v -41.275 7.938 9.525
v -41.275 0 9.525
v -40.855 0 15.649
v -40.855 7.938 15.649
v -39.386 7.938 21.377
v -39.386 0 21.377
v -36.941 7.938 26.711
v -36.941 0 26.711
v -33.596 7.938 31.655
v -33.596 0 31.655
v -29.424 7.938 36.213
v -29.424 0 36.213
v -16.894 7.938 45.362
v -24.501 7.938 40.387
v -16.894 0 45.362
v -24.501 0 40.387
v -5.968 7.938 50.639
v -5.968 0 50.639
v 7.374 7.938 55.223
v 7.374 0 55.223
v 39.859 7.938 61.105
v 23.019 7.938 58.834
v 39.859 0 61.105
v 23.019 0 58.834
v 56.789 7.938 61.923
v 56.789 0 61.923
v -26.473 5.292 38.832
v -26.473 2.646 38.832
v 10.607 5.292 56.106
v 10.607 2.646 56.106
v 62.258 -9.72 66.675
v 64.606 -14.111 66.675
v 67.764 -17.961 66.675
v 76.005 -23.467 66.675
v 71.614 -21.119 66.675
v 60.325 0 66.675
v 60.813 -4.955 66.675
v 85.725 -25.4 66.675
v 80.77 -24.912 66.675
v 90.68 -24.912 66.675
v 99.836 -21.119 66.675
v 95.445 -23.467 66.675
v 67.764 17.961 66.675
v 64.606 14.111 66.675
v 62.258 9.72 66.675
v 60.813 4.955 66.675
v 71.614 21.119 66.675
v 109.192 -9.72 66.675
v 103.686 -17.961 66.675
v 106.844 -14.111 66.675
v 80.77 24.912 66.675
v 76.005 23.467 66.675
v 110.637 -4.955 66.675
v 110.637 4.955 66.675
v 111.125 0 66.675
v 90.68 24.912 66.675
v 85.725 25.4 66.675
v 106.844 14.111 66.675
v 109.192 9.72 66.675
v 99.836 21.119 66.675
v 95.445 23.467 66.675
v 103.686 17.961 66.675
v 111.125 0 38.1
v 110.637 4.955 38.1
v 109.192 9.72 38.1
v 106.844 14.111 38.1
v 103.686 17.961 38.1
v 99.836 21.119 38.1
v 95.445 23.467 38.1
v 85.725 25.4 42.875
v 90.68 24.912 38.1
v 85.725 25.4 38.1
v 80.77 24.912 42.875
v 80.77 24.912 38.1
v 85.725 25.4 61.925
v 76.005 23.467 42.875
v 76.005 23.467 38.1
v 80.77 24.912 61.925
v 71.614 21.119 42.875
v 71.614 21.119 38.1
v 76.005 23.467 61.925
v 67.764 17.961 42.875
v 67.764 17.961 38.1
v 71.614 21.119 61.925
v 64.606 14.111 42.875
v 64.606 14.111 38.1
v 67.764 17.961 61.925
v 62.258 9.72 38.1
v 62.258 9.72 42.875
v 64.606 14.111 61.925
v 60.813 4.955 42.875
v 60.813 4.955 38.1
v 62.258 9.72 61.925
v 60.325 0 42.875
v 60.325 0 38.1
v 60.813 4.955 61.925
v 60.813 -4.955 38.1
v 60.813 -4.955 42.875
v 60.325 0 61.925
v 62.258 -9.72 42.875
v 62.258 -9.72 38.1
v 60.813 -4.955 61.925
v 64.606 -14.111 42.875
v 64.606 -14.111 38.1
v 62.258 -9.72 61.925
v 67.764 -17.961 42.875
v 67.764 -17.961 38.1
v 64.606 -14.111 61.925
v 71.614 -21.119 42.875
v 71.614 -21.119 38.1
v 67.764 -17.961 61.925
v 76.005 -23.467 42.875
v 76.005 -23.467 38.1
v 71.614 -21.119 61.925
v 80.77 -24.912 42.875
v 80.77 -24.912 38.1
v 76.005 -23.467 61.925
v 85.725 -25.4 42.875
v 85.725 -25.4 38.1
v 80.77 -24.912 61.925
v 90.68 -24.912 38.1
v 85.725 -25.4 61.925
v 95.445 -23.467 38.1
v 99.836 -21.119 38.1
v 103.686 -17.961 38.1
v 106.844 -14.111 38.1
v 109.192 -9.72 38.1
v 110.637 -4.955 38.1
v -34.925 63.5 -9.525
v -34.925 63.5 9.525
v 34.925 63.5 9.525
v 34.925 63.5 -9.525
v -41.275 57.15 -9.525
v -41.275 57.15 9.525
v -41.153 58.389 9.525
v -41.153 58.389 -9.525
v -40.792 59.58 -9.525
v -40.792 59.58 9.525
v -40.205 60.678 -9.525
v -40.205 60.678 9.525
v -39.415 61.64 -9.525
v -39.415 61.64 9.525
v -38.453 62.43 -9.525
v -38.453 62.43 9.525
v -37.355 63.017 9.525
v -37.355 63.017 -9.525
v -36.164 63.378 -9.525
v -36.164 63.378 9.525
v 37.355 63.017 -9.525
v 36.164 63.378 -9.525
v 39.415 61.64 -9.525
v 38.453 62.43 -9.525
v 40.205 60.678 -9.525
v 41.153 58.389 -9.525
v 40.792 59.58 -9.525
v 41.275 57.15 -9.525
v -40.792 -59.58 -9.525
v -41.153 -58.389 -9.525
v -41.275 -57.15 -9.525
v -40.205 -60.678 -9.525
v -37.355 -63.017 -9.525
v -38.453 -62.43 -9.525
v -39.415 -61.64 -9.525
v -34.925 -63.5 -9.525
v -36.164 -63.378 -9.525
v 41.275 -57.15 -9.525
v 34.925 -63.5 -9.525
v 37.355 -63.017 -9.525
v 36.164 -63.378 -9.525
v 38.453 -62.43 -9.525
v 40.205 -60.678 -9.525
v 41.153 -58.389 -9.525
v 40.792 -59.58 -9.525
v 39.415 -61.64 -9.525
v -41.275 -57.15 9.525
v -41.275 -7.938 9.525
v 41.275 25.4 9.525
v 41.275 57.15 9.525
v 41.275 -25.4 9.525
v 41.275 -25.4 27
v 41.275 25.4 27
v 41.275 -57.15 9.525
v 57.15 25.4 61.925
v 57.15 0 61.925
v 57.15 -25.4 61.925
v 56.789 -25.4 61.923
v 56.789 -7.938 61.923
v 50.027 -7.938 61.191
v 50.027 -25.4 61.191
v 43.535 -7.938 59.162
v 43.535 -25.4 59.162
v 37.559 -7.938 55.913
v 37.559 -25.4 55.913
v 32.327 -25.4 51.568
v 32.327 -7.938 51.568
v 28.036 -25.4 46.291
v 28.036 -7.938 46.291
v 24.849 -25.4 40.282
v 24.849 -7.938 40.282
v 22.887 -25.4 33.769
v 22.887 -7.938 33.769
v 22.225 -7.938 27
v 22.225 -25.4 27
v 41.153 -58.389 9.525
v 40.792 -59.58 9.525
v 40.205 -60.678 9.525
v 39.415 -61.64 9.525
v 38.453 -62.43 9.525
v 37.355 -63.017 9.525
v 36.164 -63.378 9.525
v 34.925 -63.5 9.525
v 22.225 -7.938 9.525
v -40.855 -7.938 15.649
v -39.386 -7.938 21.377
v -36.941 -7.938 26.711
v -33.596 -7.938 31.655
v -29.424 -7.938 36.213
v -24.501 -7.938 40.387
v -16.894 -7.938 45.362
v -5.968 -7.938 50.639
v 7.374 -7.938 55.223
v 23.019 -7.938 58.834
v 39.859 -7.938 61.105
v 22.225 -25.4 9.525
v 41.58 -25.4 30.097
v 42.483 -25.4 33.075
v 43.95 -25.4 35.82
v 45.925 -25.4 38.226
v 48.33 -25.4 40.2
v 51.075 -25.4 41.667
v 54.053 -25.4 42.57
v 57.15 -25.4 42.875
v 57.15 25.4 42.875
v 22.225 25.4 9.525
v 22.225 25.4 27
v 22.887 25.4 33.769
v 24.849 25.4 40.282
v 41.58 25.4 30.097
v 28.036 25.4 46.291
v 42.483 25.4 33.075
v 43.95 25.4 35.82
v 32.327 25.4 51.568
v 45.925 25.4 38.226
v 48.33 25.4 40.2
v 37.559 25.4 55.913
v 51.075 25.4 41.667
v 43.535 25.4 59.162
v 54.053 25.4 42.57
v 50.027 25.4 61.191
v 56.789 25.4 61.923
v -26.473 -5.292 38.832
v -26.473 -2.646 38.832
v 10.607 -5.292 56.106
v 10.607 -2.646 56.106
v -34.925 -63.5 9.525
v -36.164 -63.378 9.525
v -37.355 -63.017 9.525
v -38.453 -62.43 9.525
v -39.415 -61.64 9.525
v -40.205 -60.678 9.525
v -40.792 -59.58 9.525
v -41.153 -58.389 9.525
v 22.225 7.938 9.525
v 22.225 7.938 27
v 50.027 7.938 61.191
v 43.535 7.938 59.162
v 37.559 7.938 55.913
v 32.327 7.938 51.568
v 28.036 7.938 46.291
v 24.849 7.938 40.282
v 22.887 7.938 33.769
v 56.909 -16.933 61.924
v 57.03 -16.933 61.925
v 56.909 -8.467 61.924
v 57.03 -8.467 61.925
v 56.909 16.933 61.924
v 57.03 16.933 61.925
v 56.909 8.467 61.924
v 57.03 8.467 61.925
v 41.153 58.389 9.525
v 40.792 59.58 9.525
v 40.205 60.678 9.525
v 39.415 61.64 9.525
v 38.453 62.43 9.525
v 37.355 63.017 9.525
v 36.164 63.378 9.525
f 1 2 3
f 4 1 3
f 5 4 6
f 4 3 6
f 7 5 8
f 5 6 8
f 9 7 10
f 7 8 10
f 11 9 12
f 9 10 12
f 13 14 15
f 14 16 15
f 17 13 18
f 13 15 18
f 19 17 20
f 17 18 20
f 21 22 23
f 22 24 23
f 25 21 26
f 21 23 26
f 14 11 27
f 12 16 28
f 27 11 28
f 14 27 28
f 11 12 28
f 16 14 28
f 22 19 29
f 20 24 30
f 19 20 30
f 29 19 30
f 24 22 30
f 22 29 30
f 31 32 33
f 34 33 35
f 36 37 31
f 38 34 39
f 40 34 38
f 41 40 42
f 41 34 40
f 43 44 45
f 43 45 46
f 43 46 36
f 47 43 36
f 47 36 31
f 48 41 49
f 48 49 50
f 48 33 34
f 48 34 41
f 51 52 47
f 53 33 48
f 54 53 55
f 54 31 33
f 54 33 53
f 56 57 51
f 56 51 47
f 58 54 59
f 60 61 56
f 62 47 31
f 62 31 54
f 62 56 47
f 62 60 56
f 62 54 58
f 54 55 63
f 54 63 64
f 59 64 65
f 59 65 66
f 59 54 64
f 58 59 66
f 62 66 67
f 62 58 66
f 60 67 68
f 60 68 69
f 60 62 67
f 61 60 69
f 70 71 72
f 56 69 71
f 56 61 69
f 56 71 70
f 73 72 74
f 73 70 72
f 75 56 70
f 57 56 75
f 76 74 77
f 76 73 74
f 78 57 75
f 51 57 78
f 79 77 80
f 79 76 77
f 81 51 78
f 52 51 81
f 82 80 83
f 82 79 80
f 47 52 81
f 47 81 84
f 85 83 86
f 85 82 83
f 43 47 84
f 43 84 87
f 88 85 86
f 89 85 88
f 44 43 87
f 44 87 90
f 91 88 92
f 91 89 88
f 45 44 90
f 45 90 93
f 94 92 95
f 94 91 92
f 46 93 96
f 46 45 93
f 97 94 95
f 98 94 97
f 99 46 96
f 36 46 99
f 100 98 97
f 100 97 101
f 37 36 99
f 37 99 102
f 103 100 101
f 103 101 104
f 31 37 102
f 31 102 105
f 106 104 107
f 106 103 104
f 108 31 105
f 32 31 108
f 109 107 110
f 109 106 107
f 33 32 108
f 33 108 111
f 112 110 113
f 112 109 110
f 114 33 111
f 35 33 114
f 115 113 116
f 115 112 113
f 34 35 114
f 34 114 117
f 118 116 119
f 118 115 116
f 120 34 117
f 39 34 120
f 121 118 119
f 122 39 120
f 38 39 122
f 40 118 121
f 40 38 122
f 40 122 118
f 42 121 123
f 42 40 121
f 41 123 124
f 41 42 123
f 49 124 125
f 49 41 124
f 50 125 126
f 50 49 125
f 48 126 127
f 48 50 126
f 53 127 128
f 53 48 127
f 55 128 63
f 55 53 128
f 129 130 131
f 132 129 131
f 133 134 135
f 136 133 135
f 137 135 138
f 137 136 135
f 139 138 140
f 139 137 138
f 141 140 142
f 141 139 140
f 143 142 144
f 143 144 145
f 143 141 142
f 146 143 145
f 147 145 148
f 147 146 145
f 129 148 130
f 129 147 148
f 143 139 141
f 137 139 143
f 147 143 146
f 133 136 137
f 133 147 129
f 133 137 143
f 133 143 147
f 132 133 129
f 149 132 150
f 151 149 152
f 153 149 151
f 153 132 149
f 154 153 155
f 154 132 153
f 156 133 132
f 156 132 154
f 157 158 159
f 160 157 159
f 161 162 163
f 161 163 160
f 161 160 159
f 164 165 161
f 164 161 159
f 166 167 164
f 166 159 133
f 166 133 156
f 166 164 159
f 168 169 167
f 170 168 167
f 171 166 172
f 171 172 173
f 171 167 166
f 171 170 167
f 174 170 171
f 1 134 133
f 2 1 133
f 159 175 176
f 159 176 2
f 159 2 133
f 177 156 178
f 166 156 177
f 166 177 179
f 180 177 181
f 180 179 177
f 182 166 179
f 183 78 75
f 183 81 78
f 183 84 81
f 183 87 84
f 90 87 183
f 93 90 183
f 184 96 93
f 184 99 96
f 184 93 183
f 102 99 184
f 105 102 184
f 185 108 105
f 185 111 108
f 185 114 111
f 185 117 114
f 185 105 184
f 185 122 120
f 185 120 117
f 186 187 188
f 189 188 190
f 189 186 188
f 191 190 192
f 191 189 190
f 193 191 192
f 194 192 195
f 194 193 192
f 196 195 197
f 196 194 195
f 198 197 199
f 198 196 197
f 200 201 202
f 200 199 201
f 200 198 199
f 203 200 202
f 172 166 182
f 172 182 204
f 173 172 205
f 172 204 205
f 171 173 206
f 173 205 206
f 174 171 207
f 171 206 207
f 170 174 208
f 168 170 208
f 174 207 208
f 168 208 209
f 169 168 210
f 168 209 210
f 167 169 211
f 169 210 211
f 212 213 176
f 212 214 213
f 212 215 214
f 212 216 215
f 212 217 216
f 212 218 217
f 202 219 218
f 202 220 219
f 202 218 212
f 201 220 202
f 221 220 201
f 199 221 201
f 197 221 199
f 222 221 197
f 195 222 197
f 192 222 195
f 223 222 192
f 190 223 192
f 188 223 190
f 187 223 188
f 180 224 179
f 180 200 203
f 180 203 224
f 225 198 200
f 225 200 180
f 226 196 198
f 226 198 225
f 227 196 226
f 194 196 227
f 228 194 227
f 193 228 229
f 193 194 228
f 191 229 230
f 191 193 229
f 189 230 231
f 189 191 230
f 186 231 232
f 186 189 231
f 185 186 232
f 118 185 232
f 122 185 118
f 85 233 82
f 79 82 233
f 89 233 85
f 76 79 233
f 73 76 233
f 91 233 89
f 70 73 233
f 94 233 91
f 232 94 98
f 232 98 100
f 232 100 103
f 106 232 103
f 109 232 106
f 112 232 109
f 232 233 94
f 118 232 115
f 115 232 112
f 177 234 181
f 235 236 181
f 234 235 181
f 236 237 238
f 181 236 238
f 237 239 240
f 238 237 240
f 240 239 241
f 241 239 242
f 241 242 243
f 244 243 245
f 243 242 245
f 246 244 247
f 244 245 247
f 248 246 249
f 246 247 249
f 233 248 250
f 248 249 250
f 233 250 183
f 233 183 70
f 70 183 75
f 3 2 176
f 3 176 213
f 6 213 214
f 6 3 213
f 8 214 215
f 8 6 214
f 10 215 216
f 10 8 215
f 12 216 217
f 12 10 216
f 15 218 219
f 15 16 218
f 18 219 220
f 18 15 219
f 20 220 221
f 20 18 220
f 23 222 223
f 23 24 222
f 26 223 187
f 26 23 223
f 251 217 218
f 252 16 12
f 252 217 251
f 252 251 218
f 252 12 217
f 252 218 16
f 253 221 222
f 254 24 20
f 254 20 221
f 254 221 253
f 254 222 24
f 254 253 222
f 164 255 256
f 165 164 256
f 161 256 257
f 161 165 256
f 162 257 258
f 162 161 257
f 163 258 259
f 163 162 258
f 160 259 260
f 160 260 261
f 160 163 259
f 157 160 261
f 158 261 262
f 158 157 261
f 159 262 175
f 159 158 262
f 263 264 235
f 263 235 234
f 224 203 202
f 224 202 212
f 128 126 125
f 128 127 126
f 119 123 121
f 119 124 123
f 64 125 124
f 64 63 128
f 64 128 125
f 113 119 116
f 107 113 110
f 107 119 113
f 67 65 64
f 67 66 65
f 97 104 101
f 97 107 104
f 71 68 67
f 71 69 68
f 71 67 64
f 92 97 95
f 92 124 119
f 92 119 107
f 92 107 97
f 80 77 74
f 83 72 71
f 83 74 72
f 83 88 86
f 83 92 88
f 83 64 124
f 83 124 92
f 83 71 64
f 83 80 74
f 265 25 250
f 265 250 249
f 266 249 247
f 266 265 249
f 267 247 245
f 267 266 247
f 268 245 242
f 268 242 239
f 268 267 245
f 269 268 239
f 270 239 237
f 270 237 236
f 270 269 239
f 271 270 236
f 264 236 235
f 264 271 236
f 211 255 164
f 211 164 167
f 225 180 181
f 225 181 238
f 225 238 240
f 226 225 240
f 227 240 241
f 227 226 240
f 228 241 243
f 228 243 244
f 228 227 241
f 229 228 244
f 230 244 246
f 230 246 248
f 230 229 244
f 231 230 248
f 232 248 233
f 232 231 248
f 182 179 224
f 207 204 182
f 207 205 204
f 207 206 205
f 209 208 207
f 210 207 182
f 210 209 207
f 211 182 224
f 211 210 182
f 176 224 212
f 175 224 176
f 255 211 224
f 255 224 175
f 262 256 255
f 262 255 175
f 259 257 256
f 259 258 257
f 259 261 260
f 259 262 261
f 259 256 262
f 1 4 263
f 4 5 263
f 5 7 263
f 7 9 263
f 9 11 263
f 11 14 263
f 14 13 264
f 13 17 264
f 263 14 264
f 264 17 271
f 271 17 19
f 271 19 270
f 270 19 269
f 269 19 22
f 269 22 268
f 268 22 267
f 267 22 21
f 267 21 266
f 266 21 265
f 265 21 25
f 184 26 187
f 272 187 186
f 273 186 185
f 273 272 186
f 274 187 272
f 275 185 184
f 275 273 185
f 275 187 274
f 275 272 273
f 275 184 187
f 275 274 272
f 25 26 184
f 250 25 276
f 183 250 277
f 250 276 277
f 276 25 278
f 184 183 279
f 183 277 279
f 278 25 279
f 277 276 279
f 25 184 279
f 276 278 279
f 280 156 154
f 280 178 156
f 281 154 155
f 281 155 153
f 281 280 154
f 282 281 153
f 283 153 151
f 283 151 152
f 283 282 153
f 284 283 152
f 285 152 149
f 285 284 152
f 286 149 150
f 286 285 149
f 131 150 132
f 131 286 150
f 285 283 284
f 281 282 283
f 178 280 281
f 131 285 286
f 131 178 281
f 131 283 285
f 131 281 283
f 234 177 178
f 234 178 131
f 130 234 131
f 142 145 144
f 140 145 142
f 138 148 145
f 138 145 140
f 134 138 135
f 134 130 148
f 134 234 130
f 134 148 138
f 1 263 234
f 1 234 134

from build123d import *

# Parameters (mm, degrees)
F1_DEPTH = 63.5
F0_W     = 25.4
F0_H     = 19.05
F2_DEPTH = 25.4
F4_R     = 6.35
F5_DEPTH = 7.9375


with BuildPart() as f1:
    # F0 (on Front) → F1 (new body, symmetric)
    with BuildSketch(Plane.XZ):
        Polygon((41.275, -9.525), (41.275, 9.525), (22.225, 9.525), (-41.275, 9.525), (-41.275, -9.525), align=None)
    extrude(amount=F1_DEPTH, both=True)

    # F0 (on Front) → F2 (join, symmetric)
    with BuildSketch(Plane.XZ):
        with BuildLine():
            Line((22.225, 9.525), (41.275, 9.525))
            Line((41.275, 9.525), (41.275, 27.0002))
            ThreePointArc((41.275, 27.0002), (45.9246798487, 38.2255201513), (57.15, 42.8752))
            Line((57.15, 42.8752), (60.325, 42.8752))
            Line((60.325, 42.8752), (60.325, 61.9252))
            Line((60.325, 61.9252), (57.15, 61.9252))
            add(Edge.make_bspline(
                [(56.7889636958, 61.9233338483), (56.9093507324, 61.9240660215), (57.0296965137, 61.9246880569), (57.15, 61.9252)],
                knots=[111.215608545, 111.215608545, 111.215608545, 111.215608545, 111.5045361635, 111.5045361635, 111.5045361635, 111.5045361635], degree=3))
            ThreePointArc((56.7889636958, 61.9233338483), (32.3269782468, 51.567927124), (22.225, 27.0002))
            Line((22.225, 27.0002), (22.225, 9.525))
        make_face()
        with Locations((73.025, 52.4002)):
            Rectangle(F0_W, F0_H)
    extrude(amount=F2_DEPTH, both=True)

    # F0 (on Front) → F3 (revolve)
    with BuildSketch(Plane.XZ):
        Polygon((85.725, 61.9252), (85.725, 42.8752), (85.725, 38.1), (111.125, 38.1), (111.125, 66.675), (85.725, 66.675), align=None)
    revolve(axis=Axis((85.725, 0, 52.3875), (0, 0, 1)))

    # F4
    f4_edges = [f1.edges().sort_by_distance(p)[0] for p in [
        (41.275, -63.5, 0),
        (-41.275, -63.5, 0),
        (41.275, 63.5, 0),
        (-41.275, 63.5, 0),
    ]]
    fillet(f4_edges, radius=F4_R)

    # F0 (on Front) → F5 (join, symmetric)
    with BuildSketch(Plane.XZ):
        with BuildLine():
            Line((-41.275, 9.525), (22.225, 9.525))
            Line((22.225, 9.525), (22.225, 27.0002))
            ThreePointArc((22.225, 27.0002), (32.3269782468, 51.567927124), (56.7889636958, 61.9233338483))
            add(Edge.make_bspline(
                [(-41.275, 9.525), (-42.0038243378, 45.0408061819), (10.4489232116, 61.6415017024), (56.7889636958, 61.9233338483)],
                knots=[0, 0, 0, 0, 111.215608545, 111.215608545, 111.215608545, 111.215608545], degree=3))
        make_face()
    extrude(amount=F5_DEPTH, both=True)


solid = f1.part
